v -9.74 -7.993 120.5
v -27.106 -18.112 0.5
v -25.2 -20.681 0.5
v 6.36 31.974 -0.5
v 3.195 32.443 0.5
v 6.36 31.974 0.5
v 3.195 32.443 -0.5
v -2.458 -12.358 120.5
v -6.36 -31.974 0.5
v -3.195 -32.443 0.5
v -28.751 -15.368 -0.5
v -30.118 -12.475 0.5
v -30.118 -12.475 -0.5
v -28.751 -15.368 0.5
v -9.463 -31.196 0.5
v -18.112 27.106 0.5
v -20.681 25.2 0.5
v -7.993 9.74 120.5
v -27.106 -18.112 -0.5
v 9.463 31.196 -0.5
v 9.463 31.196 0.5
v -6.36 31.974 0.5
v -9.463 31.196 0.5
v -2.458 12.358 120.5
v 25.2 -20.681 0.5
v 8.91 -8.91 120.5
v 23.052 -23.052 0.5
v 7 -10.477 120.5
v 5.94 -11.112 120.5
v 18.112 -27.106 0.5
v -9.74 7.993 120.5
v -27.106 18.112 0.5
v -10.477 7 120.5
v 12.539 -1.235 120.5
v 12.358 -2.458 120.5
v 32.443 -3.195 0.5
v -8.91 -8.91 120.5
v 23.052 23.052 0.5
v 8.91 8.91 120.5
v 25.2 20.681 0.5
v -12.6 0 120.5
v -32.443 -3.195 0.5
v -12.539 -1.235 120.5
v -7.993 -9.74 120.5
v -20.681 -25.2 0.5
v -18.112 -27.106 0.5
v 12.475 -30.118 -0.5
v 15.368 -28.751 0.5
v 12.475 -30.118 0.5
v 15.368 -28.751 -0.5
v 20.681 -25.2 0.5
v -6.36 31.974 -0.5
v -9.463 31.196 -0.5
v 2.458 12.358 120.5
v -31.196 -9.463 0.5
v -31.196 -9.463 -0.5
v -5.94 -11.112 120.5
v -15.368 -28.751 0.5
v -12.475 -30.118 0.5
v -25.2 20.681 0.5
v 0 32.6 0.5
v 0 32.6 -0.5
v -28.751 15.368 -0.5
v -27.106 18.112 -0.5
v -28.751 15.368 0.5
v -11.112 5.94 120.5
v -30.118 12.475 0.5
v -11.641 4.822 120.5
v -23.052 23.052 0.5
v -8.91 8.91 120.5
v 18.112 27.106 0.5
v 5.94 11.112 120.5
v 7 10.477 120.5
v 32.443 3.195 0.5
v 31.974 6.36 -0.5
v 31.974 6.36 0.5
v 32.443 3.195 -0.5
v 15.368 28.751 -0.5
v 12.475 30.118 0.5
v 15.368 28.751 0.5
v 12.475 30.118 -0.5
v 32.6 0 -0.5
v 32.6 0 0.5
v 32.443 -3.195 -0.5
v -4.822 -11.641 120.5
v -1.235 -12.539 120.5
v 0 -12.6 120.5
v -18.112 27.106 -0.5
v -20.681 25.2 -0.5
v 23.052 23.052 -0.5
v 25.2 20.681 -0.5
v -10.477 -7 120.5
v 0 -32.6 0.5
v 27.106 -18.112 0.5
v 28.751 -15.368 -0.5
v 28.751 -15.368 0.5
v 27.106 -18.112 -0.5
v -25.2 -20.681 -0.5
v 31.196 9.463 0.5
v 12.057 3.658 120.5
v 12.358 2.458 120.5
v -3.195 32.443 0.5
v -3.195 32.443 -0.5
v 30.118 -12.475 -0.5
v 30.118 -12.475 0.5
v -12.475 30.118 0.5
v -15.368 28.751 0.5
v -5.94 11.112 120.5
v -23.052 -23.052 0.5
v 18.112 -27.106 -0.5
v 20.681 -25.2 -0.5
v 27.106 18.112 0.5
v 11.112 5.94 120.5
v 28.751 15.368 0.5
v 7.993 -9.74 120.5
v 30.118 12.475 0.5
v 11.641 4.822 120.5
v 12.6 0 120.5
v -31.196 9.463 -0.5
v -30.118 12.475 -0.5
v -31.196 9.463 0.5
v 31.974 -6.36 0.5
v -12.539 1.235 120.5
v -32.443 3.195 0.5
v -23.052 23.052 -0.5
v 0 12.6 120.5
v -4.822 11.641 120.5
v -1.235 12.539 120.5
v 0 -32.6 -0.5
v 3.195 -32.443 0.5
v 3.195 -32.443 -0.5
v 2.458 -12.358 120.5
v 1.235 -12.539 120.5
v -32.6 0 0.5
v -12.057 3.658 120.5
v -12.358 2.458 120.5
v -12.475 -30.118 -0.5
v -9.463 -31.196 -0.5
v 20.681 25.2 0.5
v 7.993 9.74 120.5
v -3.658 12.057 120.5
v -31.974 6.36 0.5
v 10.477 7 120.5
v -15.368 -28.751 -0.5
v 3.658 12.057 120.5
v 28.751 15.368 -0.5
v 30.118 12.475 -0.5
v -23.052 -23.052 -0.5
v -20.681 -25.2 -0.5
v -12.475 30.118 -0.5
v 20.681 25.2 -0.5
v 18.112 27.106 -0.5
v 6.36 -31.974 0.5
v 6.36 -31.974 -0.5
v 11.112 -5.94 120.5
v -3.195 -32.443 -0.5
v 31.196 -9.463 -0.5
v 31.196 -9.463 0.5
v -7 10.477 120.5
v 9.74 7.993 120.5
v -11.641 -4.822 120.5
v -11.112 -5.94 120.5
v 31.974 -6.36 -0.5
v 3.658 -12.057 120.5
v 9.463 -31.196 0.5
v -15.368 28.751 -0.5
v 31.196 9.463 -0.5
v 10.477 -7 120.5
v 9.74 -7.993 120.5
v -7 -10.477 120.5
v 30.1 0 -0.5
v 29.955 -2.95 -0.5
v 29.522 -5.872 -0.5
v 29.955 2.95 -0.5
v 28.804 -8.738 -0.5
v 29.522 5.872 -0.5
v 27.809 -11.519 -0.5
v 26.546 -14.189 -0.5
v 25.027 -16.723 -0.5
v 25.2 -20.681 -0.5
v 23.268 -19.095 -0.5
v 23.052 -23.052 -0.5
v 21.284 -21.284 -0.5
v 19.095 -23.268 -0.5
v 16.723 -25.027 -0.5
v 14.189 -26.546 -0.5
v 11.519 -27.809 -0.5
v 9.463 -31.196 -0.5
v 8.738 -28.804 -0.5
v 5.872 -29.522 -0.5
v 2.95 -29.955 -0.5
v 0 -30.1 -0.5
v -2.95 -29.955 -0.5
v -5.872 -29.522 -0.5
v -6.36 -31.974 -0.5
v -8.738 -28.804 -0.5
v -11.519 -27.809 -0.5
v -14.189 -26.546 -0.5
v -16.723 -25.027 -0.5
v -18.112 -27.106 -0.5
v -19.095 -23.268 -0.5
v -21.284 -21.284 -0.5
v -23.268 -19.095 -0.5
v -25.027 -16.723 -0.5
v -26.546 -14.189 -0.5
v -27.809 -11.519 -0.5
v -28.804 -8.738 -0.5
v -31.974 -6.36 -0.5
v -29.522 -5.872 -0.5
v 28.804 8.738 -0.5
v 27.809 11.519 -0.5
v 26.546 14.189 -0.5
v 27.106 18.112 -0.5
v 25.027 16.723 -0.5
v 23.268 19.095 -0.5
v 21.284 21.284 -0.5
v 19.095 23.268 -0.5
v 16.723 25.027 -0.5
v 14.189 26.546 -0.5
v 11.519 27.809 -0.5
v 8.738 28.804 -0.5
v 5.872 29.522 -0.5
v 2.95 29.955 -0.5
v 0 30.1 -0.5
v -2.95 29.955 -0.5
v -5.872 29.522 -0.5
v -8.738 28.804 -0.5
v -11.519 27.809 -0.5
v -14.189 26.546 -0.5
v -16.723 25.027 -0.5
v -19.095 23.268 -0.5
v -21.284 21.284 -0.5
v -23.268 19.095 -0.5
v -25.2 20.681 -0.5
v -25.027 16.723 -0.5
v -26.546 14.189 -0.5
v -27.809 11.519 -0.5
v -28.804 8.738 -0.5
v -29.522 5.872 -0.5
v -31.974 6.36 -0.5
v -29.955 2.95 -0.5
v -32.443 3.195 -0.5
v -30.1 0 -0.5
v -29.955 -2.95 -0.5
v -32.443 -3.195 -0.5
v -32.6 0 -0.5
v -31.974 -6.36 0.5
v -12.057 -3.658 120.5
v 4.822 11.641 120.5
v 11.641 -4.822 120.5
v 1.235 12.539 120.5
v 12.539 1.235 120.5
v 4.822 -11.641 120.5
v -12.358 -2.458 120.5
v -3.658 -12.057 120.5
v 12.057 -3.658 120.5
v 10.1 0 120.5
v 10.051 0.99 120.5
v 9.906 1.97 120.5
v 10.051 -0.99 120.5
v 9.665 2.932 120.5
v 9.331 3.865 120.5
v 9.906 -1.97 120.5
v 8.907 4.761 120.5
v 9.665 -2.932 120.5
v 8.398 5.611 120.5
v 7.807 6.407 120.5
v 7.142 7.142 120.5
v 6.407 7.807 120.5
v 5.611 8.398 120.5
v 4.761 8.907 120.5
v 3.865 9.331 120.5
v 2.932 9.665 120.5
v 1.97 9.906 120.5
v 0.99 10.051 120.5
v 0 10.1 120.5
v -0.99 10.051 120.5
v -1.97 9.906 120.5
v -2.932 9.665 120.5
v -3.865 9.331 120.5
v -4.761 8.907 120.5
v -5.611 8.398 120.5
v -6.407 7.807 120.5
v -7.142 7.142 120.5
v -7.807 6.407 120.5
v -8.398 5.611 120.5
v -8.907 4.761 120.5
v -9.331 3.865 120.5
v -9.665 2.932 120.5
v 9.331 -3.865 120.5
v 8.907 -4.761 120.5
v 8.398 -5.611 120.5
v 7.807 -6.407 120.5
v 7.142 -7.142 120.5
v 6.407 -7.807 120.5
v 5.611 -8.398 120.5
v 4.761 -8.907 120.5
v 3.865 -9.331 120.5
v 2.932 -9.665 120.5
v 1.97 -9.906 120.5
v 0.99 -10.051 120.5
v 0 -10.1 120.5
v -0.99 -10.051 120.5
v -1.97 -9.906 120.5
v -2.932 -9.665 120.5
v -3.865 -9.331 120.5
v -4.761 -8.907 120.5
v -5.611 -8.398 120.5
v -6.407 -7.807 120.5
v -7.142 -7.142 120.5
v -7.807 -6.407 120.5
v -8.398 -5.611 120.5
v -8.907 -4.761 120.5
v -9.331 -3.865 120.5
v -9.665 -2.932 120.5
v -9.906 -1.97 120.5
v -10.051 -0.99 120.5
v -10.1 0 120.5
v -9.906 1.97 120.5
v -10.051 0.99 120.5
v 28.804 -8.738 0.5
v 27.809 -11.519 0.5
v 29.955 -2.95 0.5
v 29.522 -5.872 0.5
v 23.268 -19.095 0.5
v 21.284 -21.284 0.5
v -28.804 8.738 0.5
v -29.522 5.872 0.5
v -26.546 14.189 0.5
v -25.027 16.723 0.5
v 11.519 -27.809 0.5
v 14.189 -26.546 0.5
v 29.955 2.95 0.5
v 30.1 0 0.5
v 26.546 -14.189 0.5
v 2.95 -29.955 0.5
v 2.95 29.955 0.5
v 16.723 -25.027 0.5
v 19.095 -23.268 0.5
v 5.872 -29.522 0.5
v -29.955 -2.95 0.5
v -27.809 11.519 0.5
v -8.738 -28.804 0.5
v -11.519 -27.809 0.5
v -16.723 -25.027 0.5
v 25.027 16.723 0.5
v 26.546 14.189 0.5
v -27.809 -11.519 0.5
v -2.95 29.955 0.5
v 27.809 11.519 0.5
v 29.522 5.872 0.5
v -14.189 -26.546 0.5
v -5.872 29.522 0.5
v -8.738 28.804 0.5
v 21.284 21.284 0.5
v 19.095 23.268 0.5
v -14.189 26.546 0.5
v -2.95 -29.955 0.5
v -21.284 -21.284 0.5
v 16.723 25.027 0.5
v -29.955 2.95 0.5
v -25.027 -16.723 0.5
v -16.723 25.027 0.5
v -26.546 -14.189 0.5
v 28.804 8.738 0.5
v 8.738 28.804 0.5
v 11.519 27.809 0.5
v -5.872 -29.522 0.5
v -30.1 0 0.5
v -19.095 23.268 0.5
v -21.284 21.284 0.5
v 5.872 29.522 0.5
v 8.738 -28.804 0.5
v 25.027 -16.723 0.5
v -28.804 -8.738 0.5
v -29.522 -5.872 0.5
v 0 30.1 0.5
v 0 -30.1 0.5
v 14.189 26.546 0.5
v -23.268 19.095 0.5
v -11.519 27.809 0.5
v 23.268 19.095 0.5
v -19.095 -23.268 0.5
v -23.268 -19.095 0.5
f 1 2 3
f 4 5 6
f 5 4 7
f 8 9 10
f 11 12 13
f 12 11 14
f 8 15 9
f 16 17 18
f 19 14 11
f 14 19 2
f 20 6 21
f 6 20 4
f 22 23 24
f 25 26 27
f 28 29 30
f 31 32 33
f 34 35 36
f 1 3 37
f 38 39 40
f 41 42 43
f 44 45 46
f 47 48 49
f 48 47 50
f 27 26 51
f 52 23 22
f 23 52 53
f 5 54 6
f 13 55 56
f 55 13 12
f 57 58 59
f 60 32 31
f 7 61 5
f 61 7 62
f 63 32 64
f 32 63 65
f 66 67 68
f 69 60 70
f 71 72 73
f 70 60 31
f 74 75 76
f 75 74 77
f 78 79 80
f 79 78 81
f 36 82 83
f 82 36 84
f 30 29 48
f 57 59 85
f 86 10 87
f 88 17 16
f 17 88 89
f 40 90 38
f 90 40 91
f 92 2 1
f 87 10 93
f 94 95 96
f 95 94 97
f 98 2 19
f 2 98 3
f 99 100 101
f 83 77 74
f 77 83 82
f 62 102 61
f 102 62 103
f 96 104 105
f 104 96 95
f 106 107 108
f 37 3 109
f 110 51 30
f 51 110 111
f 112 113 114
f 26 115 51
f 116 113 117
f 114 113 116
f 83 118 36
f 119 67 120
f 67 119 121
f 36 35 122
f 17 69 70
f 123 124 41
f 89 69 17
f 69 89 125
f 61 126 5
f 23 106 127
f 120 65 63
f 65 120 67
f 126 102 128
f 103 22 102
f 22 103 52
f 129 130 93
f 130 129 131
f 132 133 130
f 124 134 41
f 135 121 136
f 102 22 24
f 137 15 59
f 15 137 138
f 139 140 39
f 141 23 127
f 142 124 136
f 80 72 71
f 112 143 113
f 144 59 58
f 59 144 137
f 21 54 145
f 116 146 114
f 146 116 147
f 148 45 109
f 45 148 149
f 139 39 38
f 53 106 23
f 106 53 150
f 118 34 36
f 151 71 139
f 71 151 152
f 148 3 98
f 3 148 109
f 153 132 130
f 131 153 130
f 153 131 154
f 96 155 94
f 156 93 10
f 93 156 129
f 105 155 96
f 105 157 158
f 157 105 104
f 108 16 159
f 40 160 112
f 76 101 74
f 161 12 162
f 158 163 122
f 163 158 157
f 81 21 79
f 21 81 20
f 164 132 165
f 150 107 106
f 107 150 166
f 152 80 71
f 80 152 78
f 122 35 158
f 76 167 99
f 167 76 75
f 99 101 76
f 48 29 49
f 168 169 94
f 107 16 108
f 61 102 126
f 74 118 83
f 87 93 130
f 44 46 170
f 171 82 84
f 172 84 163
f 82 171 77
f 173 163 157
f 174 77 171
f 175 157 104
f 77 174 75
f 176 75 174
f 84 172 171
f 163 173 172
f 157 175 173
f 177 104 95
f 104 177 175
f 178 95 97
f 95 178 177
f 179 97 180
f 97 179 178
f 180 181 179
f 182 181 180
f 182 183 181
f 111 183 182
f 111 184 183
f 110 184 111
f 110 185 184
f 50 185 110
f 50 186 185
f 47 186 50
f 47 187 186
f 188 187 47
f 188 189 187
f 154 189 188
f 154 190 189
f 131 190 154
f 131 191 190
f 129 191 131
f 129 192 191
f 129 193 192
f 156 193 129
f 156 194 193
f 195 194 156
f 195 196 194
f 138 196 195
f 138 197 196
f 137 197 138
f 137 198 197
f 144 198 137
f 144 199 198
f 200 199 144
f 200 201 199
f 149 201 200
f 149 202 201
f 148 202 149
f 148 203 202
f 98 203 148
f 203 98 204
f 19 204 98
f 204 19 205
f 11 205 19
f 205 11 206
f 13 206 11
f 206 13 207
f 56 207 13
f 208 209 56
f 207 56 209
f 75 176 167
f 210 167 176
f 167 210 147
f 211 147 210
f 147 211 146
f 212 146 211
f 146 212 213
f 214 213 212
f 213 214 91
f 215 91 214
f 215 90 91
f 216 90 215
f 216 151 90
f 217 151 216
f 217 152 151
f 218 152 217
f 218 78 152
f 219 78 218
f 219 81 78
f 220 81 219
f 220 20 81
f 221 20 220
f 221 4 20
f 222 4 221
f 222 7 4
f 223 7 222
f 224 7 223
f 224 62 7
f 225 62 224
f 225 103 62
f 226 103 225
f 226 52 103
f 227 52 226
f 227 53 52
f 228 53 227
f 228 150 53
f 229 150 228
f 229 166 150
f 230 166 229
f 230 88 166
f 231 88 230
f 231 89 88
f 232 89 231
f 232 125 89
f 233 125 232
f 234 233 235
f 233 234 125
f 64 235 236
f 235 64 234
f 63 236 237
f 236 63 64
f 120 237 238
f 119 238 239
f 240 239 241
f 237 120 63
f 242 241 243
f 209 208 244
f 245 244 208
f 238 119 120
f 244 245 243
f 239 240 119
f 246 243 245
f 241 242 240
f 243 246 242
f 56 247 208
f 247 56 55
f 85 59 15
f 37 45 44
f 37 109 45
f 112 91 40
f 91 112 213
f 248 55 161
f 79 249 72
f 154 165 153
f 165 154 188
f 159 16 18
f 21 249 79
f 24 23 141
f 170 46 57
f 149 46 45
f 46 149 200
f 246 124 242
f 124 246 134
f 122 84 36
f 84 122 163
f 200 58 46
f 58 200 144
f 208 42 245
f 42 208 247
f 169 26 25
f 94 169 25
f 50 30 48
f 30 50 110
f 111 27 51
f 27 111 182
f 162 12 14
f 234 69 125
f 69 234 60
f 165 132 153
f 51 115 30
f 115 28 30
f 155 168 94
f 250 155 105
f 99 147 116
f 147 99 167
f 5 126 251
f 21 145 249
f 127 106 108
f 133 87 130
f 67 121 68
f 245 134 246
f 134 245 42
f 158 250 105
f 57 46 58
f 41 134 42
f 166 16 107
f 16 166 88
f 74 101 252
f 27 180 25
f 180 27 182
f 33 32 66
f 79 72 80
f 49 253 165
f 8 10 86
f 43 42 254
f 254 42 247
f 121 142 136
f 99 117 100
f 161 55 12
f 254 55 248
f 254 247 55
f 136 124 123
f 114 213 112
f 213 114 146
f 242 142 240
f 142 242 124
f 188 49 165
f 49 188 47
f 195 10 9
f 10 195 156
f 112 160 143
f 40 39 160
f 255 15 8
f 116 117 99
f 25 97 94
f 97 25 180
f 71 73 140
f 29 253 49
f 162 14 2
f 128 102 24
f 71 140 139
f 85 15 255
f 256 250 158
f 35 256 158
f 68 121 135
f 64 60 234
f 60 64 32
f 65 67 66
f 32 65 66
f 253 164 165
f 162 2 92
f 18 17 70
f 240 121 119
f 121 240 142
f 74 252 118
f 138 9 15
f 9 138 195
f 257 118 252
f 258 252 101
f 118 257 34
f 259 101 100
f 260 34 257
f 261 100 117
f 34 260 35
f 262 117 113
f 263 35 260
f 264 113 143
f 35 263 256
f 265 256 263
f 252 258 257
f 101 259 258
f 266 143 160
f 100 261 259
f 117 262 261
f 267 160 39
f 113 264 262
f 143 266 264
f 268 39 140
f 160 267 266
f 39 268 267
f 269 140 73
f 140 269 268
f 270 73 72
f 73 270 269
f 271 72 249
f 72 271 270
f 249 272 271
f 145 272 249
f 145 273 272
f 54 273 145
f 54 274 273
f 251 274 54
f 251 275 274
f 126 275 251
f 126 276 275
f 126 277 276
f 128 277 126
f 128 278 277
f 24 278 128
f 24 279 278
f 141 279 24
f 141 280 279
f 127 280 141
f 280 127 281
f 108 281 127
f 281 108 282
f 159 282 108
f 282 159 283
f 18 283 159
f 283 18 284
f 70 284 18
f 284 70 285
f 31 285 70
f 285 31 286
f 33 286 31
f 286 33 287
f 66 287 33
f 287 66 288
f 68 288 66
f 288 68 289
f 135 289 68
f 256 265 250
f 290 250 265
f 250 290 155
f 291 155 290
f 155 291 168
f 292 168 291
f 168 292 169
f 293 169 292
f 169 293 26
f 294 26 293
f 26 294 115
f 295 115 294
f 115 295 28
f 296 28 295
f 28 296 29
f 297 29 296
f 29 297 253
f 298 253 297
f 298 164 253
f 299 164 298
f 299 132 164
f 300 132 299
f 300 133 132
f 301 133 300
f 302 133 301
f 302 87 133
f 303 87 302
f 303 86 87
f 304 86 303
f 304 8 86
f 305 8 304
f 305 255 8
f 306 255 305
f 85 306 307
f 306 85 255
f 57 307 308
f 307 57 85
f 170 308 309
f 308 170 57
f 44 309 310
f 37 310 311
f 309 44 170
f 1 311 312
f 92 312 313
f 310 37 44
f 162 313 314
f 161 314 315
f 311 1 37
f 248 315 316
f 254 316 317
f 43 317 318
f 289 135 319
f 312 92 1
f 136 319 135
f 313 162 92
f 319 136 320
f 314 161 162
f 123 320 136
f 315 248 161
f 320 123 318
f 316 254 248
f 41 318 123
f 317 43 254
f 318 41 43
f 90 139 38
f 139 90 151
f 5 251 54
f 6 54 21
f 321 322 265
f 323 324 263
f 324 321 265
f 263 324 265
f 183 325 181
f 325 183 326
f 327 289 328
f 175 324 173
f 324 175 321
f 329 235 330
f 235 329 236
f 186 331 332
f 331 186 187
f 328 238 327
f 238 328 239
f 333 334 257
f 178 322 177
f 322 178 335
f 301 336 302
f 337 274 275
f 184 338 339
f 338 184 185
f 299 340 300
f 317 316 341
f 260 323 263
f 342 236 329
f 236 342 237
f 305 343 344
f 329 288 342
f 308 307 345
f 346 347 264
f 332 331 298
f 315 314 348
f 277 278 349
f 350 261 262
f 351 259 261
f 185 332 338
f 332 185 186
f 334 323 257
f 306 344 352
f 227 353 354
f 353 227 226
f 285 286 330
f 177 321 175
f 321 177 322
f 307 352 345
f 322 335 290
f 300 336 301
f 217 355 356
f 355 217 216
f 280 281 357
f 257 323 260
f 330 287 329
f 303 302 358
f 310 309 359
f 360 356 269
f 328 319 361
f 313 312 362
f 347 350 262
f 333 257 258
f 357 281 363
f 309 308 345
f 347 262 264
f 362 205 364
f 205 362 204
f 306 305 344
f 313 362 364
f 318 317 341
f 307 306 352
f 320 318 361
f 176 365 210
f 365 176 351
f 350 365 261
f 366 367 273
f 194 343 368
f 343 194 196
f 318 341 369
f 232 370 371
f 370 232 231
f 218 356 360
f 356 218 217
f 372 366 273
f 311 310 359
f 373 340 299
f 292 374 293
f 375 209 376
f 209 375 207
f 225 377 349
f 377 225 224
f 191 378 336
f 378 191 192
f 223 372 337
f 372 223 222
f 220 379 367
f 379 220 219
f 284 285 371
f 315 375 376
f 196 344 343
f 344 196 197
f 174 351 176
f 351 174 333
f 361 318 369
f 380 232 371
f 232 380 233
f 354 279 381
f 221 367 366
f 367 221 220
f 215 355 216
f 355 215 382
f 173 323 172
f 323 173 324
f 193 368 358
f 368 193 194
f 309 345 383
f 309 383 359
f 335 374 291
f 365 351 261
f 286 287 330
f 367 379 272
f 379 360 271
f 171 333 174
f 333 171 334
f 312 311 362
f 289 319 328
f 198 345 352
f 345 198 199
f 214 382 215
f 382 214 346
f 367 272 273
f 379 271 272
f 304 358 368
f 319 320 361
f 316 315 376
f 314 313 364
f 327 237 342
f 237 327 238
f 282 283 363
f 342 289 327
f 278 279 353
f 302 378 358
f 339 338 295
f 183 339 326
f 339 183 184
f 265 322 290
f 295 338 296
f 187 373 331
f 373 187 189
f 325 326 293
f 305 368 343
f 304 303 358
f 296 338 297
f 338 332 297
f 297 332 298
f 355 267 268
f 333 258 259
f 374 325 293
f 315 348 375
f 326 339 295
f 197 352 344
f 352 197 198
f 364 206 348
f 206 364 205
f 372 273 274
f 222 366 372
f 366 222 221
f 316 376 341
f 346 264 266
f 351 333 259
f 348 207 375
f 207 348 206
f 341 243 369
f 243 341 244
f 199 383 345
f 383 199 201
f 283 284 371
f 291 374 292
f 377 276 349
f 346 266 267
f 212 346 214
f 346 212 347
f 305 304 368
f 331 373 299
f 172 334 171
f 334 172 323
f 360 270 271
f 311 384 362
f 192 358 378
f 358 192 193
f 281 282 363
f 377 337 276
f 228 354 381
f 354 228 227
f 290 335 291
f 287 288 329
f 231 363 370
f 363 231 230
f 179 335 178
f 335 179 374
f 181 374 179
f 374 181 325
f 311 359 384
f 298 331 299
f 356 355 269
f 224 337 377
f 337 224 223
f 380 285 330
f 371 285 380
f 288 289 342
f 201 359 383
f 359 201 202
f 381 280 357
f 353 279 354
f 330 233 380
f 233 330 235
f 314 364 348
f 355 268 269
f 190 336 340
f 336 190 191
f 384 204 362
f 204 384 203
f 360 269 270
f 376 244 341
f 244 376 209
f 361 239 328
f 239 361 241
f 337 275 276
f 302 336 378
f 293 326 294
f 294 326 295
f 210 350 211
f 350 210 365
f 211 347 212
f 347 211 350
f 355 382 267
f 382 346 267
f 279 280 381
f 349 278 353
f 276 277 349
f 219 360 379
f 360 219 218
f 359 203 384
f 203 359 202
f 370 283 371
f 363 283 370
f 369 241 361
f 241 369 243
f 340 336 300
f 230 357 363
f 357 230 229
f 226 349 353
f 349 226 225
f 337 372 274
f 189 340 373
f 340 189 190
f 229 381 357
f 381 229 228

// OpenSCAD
// hand fan adapter
// direct air flow
// version 
// 03.08.2026 Sebastian Weigl

$fn=64;

// declare vars
difference() {
  // outer body
  hull() {
  translate([0,0,120])
  cylinder(h=1,d=25.2,center=true);  
  translate([0,0,0])
  cylinder(h=1,d=65.2,center=true);
  }

  // inner body
  #hull() {
    translate([0,0,120])
    cylinder(h=1,d=20.2,center=true);  
    translate([0,0,0])
    cylinder(h=1,d=60.2,center=true);
    }
  }
